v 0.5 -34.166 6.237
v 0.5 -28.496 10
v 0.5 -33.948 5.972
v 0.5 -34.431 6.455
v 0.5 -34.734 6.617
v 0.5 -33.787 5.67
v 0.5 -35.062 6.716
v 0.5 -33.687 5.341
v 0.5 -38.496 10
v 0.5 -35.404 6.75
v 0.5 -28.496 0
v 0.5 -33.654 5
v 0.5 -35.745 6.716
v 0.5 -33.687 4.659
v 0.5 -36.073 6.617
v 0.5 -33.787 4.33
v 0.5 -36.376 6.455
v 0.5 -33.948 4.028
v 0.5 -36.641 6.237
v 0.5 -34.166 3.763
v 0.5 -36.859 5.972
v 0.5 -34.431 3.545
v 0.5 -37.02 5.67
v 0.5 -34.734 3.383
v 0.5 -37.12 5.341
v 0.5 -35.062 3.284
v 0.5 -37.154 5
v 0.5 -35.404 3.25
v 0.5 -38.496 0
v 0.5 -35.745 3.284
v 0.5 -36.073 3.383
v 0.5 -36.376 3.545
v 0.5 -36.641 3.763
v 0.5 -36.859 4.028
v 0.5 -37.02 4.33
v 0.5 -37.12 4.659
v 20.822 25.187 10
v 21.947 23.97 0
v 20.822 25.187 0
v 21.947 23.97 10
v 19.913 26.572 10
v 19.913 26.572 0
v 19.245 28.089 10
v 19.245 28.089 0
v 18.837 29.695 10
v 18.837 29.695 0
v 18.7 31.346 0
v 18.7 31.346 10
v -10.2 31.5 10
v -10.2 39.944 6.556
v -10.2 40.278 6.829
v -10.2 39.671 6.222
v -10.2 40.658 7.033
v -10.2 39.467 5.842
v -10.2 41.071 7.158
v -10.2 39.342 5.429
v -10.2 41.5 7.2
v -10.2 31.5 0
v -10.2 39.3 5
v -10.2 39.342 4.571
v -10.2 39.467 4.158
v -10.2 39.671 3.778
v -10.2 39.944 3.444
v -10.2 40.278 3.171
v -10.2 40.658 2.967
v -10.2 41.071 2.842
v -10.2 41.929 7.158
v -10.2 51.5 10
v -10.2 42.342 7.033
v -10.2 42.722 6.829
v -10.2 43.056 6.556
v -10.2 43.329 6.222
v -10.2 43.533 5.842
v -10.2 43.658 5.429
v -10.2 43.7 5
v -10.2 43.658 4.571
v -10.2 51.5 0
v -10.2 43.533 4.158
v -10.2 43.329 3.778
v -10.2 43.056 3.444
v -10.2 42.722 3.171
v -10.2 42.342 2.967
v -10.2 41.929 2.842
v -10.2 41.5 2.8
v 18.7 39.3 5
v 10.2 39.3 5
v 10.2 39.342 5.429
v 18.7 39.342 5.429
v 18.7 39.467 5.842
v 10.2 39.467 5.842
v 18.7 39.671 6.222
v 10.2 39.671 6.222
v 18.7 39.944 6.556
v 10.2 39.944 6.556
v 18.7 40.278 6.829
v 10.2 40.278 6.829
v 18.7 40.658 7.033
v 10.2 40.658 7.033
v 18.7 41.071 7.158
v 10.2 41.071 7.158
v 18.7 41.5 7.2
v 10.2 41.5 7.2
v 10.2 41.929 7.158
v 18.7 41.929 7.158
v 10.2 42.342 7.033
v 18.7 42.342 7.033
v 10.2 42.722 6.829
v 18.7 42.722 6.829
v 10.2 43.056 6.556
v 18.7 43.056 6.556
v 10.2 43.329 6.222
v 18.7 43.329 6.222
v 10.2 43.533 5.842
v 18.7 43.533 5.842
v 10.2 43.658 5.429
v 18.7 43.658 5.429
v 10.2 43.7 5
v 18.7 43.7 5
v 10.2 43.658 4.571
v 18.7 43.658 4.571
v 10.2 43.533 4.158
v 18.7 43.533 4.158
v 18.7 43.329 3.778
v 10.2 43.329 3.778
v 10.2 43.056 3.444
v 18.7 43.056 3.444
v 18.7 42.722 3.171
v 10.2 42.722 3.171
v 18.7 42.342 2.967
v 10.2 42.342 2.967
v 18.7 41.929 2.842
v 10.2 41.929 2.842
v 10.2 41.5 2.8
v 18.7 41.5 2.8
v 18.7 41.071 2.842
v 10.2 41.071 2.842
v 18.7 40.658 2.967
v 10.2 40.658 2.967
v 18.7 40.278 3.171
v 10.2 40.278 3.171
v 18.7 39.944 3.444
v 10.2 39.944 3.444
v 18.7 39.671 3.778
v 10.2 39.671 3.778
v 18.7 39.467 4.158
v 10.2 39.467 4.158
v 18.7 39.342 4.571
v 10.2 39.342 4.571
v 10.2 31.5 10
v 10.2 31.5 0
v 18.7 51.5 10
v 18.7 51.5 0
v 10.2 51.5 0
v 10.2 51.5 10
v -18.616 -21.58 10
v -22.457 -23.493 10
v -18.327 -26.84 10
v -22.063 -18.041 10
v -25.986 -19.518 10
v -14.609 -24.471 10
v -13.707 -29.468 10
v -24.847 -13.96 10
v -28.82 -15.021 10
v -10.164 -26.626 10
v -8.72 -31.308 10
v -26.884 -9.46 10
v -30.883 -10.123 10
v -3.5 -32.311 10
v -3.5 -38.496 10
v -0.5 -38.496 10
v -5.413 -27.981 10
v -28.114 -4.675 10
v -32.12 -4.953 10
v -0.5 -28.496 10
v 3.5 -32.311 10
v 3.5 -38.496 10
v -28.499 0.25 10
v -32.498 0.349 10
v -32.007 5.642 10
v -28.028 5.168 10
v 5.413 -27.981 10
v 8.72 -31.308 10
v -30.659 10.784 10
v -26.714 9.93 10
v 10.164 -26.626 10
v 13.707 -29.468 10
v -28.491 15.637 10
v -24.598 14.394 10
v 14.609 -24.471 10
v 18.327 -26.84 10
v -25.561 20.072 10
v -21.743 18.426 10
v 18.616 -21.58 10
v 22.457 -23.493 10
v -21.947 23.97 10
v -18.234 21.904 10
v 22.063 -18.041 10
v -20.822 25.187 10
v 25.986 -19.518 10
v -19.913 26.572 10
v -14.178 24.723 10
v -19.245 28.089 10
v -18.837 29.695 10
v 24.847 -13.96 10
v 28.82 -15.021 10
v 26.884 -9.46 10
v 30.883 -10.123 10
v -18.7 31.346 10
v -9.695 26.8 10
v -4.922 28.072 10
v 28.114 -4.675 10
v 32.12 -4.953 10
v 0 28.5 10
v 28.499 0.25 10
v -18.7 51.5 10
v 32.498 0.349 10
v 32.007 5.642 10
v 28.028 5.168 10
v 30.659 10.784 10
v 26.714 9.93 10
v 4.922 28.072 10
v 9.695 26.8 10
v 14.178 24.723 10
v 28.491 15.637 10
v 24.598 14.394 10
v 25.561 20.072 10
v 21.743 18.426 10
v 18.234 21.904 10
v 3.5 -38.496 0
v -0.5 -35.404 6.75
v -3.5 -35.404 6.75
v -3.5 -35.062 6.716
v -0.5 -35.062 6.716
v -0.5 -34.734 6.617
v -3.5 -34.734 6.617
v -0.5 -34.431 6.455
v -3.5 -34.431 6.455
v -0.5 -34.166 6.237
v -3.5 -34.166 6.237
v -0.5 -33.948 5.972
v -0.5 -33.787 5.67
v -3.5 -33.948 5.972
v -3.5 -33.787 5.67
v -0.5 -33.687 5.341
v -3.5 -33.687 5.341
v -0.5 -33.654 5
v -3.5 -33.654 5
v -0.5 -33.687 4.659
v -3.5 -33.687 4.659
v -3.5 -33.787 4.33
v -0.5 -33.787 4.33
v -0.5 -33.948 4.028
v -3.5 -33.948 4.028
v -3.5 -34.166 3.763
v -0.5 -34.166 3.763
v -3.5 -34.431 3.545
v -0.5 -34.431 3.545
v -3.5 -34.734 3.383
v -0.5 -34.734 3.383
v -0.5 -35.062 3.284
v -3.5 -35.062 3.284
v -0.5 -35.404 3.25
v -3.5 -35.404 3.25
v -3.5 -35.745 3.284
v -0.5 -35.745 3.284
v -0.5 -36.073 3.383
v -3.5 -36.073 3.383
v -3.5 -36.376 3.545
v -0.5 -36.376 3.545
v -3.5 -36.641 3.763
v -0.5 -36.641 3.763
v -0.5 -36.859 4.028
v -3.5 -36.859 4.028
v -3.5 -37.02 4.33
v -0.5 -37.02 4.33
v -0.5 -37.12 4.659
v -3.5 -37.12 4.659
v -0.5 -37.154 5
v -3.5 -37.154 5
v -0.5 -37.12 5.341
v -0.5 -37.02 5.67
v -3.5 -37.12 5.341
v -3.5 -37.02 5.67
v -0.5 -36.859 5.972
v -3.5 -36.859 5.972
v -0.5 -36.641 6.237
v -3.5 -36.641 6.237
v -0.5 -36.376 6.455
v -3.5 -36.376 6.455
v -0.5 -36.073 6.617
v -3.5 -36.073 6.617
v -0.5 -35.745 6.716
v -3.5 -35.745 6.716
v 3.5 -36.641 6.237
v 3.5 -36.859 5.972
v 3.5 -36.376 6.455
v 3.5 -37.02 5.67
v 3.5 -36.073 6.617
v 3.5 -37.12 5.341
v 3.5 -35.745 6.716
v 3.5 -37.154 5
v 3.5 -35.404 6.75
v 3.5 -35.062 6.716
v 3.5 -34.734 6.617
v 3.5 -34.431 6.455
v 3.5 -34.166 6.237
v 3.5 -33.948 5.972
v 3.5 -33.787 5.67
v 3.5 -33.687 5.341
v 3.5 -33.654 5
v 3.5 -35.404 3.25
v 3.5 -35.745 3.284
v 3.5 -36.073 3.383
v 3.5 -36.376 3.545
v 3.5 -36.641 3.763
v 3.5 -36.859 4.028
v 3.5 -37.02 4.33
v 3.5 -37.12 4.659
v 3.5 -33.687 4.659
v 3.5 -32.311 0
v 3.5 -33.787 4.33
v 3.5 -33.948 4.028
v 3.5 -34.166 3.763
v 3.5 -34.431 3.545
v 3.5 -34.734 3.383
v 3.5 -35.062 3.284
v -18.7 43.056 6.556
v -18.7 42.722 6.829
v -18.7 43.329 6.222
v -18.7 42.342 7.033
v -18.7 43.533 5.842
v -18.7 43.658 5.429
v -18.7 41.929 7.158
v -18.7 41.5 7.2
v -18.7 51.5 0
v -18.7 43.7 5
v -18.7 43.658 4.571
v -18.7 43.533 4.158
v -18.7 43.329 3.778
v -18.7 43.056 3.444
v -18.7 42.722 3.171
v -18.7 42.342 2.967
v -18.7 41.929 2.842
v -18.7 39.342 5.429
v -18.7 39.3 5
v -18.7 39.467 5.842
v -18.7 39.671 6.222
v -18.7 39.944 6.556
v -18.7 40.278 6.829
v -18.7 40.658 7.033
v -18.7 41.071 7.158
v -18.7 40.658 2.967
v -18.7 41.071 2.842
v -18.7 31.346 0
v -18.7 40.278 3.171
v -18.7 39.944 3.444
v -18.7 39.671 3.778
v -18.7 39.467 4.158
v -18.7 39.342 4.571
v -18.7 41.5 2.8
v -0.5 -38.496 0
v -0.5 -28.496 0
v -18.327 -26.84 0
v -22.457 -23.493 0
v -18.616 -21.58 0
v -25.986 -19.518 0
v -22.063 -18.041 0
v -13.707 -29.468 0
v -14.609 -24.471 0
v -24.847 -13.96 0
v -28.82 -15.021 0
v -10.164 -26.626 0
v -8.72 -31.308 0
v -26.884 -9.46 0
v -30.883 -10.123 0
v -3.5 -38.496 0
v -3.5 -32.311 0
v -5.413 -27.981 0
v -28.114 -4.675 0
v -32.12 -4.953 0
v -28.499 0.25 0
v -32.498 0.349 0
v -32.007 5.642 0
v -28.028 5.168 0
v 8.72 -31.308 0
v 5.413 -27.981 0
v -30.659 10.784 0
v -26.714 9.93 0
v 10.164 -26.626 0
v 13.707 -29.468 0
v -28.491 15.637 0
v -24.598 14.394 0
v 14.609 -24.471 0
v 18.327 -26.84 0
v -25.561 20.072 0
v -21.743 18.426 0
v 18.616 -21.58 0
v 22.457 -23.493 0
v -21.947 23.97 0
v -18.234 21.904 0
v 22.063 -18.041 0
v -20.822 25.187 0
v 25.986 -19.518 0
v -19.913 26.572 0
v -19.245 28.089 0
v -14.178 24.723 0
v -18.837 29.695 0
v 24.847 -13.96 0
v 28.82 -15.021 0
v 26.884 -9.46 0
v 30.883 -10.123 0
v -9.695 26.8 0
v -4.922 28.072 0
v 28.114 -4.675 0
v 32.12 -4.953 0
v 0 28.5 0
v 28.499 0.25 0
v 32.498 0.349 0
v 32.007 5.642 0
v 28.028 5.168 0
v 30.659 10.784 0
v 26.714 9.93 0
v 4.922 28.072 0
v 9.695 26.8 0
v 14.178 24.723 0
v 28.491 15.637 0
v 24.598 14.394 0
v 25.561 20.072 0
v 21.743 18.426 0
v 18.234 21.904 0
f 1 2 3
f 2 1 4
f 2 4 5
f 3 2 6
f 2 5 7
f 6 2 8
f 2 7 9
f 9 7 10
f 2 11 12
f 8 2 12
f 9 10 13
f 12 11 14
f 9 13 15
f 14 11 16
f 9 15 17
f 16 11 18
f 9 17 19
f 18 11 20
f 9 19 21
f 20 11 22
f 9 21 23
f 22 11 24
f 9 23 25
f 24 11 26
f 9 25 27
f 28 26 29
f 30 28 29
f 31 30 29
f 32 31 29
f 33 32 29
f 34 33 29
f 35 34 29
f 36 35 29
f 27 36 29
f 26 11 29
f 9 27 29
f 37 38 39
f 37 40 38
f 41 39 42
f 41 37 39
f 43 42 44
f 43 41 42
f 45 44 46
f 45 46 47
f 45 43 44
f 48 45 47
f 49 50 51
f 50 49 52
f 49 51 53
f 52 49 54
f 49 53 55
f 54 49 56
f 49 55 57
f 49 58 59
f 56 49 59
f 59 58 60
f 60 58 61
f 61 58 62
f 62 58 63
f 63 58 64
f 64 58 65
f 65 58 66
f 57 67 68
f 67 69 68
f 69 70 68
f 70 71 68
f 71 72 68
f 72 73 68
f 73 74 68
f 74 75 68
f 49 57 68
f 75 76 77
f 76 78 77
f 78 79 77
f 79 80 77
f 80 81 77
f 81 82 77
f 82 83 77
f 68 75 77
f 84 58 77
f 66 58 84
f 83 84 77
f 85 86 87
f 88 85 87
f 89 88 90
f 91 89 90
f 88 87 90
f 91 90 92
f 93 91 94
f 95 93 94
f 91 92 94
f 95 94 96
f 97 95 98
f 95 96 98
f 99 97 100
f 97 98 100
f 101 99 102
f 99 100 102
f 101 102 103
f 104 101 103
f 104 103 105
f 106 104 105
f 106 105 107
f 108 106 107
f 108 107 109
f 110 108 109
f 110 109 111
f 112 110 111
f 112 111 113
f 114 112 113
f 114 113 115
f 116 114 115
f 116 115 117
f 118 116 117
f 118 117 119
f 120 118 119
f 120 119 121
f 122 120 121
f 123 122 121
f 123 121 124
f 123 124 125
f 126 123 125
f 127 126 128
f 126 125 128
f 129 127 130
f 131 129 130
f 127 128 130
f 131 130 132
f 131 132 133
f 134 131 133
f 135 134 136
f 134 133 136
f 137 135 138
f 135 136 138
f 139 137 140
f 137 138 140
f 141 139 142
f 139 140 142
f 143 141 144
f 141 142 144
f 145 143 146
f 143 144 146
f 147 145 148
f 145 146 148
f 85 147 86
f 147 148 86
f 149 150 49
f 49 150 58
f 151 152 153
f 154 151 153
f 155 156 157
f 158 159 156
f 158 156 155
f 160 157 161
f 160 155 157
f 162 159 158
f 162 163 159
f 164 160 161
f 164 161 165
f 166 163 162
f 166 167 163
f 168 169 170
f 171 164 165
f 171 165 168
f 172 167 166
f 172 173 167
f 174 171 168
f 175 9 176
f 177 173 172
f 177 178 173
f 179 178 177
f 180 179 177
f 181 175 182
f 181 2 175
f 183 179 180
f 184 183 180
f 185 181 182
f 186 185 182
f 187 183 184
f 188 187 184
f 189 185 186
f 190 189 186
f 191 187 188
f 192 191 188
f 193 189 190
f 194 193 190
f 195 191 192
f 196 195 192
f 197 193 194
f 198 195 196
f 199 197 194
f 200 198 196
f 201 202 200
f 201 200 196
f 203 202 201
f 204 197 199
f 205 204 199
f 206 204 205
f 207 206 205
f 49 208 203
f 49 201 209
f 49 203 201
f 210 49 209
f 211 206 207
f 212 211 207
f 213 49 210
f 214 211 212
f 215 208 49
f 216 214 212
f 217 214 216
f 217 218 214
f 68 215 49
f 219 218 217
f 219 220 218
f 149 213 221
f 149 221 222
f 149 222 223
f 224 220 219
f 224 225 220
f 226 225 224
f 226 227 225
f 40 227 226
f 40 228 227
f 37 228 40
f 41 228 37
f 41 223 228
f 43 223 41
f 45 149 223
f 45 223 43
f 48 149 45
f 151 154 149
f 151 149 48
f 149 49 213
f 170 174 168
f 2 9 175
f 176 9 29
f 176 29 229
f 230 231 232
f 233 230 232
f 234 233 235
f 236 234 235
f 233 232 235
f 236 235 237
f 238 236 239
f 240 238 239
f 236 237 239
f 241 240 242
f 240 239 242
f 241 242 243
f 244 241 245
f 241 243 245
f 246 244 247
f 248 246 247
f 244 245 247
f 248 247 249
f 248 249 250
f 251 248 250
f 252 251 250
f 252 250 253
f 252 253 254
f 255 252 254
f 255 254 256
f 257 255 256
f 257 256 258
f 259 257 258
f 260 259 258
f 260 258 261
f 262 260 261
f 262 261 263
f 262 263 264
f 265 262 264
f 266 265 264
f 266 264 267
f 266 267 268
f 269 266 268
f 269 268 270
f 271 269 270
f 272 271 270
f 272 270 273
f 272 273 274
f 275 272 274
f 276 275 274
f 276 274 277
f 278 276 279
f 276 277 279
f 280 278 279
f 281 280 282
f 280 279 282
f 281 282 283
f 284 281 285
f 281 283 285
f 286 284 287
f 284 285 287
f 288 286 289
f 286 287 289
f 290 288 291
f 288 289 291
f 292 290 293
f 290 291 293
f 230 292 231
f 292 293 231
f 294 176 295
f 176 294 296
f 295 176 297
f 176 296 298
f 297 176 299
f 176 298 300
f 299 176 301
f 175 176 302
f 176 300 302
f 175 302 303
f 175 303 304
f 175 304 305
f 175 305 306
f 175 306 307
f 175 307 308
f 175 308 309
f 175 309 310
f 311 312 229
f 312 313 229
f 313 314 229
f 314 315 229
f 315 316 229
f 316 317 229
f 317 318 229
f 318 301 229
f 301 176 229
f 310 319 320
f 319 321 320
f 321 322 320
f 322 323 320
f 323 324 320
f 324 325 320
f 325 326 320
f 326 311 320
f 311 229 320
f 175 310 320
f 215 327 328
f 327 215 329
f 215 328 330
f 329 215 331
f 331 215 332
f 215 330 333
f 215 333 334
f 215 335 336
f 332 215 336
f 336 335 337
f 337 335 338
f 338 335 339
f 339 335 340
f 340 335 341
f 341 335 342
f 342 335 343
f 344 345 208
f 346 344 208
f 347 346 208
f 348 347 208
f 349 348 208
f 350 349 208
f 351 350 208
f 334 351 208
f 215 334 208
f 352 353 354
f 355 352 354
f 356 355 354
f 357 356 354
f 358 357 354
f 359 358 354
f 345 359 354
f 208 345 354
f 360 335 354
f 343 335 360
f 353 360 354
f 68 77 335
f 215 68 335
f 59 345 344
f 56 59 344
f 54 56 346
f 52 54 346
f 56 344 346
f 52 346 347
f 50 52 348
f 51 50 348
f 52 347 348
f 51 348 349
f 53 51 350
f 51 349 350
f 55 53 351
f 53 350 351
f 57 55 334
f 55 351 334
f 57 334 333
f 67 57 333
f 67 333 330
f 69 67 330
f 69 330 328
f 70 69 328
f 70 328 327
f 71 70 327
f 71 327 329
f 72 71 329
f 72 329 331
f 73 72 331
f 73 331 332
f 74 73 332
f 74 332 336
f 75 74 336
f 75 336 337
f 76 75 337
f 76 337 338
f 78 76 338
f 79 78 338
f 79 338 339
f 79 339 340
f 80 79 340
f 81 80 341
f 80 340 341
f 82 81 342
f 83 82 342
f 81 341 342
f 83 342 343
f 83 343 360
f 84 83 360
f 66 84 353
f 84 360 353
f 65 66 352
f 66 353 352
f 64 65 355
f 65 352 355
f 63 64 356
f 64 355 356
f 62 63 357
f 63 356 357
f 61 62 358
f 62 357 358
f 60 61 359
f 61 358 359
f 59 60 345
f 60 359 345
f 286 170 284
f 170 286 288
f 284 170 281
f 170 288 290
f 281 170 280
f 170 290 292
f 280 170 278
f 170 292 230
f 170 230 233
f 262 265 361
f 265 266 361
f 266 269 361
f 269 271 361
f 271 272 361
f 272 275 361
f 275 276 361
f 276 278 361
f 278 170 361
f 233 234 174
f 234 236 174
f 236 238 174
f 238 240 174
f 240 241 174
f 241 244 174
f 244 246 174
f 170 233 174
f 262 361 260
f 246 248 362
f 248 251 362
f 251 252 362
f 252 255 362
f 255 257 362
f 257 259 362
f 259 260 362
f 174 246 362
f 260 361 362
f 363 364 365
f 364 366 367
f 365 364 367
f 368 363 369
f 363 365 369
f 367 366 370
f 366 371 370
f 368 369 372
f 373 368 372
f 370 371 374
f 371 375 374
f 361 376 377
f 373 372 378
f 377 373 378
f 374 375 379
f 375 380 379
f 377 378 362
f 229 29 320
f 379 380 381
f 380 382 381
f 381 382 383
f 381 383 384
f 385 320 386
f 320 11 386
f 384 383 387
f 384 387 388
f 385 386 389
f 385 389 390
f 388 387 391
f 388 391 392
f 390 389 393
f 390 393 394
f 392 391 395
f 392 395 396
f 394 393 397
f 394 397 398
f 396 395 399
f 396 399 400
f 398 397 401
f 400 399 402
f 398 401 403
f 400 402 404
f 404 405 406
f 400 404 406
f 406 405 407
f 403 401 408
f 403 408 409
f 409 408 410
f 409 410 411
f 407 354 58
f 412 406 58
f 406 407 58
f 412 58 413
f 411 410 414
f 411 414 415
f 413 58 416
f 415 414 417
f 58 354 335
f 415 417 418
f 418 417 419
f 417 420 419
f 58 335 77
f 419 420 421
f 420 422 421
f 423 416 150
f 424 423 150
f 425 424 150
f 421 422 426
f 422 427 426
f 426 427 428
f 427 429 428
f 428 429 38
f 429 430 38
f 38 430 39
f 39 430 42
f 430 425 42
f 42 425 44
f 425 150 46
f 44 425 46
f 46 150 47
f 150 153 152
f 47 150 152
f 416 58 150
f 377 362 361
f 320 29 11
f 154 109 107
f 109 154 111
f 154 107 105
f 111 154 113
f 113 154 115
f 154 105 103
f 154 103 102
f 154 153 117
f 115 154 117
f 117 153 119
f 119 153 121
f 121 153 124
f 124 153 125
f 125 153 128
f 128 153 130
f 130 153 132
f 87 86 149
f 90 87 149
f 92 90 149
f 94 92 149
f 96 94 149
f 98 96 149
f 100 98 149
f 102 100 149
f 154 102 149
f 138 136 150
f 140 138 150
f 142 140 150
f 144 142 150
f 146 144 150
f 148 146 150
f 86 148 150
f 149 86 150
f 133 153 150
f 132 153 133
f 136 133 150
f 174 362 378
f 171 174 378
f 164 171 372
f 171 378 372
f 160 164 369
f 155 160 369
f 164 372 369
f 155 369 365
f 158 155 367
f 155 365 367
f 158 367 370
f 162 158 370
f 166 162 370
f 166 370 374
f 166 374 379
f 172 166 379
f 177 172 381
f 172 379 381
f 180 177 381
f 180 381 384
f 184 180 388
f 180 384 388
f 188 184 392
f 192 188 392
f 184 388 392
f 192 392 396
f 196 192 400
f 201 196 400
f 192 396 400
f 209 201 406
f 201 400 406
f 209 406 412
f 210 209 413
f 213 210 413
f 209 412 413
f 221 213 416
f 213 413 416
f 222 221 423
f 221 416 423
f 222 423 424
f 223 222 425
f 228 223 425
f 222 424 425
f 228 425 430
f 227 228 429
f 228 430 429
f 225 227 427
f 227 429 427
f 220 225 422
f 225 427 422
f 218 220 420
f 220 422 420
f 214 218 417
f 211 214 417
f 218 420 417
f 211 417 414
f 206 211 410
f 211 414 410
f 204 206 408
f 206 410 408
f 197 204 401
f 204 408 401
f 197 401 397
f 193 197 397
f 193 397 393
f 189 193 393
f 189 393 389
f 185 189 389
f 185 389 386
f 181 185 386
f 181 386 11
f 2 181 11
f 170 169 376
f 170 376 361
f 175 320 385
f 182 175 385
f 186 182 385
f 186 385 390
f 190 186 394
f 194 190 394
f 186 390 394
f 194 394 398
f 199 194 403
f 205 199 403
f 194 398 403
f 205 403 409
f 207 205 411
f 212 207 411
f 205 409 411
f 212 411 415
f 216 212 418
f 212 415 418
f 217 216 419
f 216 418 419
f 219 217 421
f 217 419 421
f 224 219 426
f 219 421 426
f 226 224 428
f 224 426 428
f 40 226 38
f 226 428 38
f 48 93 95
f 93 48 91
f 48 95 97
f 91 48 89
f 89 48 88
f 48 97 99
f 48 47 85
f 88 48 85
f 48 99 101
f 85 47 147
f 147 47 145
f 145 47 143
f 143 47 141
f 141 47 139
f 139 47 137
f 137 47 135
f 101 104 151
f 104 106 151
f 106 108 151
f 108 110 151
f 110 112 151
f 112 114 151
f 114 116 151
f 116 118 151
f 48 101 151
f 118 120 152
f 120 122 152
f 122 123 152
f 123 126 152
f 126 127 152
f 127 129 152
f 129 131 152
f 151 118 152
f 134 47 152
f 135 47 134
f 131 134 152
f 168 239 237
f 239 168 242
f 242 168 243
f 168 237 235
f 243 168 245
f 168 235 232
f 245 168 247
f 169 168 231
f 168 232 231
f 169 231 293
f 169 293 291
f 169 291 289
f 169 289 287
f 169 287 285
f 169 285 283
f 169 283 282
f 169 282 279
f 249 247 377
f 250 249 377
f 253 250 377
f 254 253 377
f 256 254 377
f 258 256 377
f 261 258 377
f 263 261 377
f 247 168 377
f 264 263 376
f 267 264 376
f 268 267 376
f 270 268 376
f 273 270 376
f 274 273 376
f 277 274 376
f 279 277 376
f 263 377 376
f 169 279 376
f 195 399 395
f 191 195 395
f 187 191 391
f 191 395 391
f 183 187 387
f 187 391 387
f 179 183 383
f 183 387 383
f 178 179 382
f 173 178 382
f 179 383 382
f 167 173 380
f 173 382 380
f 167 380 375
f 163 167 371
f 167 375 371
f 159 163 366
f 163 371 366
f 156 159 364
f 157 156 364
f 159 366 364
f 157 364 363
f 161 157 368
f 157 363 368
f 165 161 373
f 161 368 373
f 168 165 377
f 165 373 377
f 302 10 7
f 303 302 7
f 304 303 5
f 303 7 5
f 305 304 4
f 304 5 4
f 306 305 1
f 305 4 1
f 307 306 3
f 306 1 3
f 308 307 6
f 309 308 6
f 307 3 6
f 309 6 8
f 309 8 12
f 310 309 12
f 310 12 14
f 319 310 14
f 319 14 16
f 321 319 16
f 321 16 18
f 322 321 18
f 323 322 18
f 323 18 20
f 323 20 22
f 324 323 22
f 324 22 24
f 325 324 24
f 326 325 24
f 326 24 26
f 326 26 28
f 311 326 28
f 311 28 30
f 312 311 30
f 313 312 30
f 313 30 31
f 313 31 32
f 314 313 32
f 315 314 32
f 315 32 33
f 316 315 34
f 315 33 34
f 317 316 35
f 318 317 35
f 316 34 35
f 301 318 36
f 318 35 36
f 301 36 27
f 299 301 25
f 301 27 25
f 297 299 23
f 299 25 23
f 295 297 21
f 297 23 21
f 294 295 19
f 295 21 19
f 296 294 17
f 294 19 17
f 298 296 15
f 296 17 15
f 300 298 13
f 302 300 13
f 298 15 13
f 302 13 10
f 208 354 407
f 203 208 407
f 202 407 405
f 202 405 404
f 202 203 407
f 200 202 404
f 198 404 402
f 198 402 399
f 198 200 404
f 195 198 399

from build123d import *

# Parameters (mm, degrees)
AUFSATZ_LINEAR_AUSTRAGEN1_DEPTH = 10
SKIZZE2_R                       = 1.75
SCHNITT_LINEAR_AUSTRAGEN1_DEPTH = 64.625859523
SKIZZE4_R                       = 2.2
SCHNITT_LINEAR_AUSTRAGEN3_DEPTH = 74.305456823
VERRUNDUNG1_R                   = 10


with BuildPart() as part:
    # Skizze1 → Aufsatz-Linear austragen1 (new body)
    with BuildSketch(Plane.XY):
        with BuildLine():
            Line((0.5, -28.495613698), (0.5, -32.496153619))
            Line((0.5, -32.496153619), (0.5, -38.496153619))
            Line((0.5, -38.496153619), (3.5, -38.496153619))
            Line((3.5, -38.496153619), (3.5, -32.310988843))
            ThreePointArc((3.5, -32.310988843), (31.468752272, -8.122045953), (18.7, 26.581196361))
            Line((18.7, 26.581196361), (18.7, 51.5))
            Line((18.7, 51.5), (10.2, 51.5))
            Line((10.2, 51.5), (10.2, 31.5))
            Line((10.2, 31.5), (-10.2, 31.5))
            Line((-10.2, 31.5), (-10.2, 51.5))
            Line((-10.2, 51.5), (-18.7, 51.5))
            Line((-18.7, 51.5), (-18.7, 26.581196361))
            ThreePointArc((-18.7, 26.581196361), (-31.468752272, -8.122045953), (-3.5, -32.310988843))
            Line((-3.5, -32.310988843), (-3.5, -38.496153619))
            Line((-3.5, -38.496153619), (-0.5, -38.496153619))
            Line((-0.5, -38.496153619), (-0.5, -32.496153619))
            Line((-0.5, -32.496153619), (-0.5, -28.495613698))
            ThreePointArc((-0.5, -28.495613698), (0, 28.5), (0.5, -28.495613698))
        make_face()
    extrude(amount=AUFSATZ_LINEAR_AUSTRAGEN1_DEPTH)

    # Skizze2 → Schnitt-Linear austragen1 (cut, through all)
    with BuildSketch(Plane.ZY.offset(3.5)):
        with Locations((5, -35.403571231)):
            Circle(SKIZZE2_R)
    extrude(amount=-SCHNITT_LINEAR_AUSTRAGEN1_DEPTH, mode=Mode.SUBTRACT)

    # Skizze4 → Schnitt-Linear austragen3 (cut, through all)
    with BuildSketch(Plane.ZY.offset(18.7)):
        with Locations(Location((5, 41.5, 0), (0, 0, 270))):
            Circle(SKIZZE4_R)
    extrude(amount=-SCHNITT_LINEAR_AUSTRAGEN3_DEPTH, mode=Mode.SUBTRACT)

    # Verrundung1
    verrundung1_edges = [part.edges().sort_by_distance(p)[0] for p in [
        (-18.7, 26.581196361, 5),
        (18.7, 26.581196361, 5),
    ]]
    fillet(verrundung1_edges, radius=VERRUNDUNG1_R)


solid = part.part
